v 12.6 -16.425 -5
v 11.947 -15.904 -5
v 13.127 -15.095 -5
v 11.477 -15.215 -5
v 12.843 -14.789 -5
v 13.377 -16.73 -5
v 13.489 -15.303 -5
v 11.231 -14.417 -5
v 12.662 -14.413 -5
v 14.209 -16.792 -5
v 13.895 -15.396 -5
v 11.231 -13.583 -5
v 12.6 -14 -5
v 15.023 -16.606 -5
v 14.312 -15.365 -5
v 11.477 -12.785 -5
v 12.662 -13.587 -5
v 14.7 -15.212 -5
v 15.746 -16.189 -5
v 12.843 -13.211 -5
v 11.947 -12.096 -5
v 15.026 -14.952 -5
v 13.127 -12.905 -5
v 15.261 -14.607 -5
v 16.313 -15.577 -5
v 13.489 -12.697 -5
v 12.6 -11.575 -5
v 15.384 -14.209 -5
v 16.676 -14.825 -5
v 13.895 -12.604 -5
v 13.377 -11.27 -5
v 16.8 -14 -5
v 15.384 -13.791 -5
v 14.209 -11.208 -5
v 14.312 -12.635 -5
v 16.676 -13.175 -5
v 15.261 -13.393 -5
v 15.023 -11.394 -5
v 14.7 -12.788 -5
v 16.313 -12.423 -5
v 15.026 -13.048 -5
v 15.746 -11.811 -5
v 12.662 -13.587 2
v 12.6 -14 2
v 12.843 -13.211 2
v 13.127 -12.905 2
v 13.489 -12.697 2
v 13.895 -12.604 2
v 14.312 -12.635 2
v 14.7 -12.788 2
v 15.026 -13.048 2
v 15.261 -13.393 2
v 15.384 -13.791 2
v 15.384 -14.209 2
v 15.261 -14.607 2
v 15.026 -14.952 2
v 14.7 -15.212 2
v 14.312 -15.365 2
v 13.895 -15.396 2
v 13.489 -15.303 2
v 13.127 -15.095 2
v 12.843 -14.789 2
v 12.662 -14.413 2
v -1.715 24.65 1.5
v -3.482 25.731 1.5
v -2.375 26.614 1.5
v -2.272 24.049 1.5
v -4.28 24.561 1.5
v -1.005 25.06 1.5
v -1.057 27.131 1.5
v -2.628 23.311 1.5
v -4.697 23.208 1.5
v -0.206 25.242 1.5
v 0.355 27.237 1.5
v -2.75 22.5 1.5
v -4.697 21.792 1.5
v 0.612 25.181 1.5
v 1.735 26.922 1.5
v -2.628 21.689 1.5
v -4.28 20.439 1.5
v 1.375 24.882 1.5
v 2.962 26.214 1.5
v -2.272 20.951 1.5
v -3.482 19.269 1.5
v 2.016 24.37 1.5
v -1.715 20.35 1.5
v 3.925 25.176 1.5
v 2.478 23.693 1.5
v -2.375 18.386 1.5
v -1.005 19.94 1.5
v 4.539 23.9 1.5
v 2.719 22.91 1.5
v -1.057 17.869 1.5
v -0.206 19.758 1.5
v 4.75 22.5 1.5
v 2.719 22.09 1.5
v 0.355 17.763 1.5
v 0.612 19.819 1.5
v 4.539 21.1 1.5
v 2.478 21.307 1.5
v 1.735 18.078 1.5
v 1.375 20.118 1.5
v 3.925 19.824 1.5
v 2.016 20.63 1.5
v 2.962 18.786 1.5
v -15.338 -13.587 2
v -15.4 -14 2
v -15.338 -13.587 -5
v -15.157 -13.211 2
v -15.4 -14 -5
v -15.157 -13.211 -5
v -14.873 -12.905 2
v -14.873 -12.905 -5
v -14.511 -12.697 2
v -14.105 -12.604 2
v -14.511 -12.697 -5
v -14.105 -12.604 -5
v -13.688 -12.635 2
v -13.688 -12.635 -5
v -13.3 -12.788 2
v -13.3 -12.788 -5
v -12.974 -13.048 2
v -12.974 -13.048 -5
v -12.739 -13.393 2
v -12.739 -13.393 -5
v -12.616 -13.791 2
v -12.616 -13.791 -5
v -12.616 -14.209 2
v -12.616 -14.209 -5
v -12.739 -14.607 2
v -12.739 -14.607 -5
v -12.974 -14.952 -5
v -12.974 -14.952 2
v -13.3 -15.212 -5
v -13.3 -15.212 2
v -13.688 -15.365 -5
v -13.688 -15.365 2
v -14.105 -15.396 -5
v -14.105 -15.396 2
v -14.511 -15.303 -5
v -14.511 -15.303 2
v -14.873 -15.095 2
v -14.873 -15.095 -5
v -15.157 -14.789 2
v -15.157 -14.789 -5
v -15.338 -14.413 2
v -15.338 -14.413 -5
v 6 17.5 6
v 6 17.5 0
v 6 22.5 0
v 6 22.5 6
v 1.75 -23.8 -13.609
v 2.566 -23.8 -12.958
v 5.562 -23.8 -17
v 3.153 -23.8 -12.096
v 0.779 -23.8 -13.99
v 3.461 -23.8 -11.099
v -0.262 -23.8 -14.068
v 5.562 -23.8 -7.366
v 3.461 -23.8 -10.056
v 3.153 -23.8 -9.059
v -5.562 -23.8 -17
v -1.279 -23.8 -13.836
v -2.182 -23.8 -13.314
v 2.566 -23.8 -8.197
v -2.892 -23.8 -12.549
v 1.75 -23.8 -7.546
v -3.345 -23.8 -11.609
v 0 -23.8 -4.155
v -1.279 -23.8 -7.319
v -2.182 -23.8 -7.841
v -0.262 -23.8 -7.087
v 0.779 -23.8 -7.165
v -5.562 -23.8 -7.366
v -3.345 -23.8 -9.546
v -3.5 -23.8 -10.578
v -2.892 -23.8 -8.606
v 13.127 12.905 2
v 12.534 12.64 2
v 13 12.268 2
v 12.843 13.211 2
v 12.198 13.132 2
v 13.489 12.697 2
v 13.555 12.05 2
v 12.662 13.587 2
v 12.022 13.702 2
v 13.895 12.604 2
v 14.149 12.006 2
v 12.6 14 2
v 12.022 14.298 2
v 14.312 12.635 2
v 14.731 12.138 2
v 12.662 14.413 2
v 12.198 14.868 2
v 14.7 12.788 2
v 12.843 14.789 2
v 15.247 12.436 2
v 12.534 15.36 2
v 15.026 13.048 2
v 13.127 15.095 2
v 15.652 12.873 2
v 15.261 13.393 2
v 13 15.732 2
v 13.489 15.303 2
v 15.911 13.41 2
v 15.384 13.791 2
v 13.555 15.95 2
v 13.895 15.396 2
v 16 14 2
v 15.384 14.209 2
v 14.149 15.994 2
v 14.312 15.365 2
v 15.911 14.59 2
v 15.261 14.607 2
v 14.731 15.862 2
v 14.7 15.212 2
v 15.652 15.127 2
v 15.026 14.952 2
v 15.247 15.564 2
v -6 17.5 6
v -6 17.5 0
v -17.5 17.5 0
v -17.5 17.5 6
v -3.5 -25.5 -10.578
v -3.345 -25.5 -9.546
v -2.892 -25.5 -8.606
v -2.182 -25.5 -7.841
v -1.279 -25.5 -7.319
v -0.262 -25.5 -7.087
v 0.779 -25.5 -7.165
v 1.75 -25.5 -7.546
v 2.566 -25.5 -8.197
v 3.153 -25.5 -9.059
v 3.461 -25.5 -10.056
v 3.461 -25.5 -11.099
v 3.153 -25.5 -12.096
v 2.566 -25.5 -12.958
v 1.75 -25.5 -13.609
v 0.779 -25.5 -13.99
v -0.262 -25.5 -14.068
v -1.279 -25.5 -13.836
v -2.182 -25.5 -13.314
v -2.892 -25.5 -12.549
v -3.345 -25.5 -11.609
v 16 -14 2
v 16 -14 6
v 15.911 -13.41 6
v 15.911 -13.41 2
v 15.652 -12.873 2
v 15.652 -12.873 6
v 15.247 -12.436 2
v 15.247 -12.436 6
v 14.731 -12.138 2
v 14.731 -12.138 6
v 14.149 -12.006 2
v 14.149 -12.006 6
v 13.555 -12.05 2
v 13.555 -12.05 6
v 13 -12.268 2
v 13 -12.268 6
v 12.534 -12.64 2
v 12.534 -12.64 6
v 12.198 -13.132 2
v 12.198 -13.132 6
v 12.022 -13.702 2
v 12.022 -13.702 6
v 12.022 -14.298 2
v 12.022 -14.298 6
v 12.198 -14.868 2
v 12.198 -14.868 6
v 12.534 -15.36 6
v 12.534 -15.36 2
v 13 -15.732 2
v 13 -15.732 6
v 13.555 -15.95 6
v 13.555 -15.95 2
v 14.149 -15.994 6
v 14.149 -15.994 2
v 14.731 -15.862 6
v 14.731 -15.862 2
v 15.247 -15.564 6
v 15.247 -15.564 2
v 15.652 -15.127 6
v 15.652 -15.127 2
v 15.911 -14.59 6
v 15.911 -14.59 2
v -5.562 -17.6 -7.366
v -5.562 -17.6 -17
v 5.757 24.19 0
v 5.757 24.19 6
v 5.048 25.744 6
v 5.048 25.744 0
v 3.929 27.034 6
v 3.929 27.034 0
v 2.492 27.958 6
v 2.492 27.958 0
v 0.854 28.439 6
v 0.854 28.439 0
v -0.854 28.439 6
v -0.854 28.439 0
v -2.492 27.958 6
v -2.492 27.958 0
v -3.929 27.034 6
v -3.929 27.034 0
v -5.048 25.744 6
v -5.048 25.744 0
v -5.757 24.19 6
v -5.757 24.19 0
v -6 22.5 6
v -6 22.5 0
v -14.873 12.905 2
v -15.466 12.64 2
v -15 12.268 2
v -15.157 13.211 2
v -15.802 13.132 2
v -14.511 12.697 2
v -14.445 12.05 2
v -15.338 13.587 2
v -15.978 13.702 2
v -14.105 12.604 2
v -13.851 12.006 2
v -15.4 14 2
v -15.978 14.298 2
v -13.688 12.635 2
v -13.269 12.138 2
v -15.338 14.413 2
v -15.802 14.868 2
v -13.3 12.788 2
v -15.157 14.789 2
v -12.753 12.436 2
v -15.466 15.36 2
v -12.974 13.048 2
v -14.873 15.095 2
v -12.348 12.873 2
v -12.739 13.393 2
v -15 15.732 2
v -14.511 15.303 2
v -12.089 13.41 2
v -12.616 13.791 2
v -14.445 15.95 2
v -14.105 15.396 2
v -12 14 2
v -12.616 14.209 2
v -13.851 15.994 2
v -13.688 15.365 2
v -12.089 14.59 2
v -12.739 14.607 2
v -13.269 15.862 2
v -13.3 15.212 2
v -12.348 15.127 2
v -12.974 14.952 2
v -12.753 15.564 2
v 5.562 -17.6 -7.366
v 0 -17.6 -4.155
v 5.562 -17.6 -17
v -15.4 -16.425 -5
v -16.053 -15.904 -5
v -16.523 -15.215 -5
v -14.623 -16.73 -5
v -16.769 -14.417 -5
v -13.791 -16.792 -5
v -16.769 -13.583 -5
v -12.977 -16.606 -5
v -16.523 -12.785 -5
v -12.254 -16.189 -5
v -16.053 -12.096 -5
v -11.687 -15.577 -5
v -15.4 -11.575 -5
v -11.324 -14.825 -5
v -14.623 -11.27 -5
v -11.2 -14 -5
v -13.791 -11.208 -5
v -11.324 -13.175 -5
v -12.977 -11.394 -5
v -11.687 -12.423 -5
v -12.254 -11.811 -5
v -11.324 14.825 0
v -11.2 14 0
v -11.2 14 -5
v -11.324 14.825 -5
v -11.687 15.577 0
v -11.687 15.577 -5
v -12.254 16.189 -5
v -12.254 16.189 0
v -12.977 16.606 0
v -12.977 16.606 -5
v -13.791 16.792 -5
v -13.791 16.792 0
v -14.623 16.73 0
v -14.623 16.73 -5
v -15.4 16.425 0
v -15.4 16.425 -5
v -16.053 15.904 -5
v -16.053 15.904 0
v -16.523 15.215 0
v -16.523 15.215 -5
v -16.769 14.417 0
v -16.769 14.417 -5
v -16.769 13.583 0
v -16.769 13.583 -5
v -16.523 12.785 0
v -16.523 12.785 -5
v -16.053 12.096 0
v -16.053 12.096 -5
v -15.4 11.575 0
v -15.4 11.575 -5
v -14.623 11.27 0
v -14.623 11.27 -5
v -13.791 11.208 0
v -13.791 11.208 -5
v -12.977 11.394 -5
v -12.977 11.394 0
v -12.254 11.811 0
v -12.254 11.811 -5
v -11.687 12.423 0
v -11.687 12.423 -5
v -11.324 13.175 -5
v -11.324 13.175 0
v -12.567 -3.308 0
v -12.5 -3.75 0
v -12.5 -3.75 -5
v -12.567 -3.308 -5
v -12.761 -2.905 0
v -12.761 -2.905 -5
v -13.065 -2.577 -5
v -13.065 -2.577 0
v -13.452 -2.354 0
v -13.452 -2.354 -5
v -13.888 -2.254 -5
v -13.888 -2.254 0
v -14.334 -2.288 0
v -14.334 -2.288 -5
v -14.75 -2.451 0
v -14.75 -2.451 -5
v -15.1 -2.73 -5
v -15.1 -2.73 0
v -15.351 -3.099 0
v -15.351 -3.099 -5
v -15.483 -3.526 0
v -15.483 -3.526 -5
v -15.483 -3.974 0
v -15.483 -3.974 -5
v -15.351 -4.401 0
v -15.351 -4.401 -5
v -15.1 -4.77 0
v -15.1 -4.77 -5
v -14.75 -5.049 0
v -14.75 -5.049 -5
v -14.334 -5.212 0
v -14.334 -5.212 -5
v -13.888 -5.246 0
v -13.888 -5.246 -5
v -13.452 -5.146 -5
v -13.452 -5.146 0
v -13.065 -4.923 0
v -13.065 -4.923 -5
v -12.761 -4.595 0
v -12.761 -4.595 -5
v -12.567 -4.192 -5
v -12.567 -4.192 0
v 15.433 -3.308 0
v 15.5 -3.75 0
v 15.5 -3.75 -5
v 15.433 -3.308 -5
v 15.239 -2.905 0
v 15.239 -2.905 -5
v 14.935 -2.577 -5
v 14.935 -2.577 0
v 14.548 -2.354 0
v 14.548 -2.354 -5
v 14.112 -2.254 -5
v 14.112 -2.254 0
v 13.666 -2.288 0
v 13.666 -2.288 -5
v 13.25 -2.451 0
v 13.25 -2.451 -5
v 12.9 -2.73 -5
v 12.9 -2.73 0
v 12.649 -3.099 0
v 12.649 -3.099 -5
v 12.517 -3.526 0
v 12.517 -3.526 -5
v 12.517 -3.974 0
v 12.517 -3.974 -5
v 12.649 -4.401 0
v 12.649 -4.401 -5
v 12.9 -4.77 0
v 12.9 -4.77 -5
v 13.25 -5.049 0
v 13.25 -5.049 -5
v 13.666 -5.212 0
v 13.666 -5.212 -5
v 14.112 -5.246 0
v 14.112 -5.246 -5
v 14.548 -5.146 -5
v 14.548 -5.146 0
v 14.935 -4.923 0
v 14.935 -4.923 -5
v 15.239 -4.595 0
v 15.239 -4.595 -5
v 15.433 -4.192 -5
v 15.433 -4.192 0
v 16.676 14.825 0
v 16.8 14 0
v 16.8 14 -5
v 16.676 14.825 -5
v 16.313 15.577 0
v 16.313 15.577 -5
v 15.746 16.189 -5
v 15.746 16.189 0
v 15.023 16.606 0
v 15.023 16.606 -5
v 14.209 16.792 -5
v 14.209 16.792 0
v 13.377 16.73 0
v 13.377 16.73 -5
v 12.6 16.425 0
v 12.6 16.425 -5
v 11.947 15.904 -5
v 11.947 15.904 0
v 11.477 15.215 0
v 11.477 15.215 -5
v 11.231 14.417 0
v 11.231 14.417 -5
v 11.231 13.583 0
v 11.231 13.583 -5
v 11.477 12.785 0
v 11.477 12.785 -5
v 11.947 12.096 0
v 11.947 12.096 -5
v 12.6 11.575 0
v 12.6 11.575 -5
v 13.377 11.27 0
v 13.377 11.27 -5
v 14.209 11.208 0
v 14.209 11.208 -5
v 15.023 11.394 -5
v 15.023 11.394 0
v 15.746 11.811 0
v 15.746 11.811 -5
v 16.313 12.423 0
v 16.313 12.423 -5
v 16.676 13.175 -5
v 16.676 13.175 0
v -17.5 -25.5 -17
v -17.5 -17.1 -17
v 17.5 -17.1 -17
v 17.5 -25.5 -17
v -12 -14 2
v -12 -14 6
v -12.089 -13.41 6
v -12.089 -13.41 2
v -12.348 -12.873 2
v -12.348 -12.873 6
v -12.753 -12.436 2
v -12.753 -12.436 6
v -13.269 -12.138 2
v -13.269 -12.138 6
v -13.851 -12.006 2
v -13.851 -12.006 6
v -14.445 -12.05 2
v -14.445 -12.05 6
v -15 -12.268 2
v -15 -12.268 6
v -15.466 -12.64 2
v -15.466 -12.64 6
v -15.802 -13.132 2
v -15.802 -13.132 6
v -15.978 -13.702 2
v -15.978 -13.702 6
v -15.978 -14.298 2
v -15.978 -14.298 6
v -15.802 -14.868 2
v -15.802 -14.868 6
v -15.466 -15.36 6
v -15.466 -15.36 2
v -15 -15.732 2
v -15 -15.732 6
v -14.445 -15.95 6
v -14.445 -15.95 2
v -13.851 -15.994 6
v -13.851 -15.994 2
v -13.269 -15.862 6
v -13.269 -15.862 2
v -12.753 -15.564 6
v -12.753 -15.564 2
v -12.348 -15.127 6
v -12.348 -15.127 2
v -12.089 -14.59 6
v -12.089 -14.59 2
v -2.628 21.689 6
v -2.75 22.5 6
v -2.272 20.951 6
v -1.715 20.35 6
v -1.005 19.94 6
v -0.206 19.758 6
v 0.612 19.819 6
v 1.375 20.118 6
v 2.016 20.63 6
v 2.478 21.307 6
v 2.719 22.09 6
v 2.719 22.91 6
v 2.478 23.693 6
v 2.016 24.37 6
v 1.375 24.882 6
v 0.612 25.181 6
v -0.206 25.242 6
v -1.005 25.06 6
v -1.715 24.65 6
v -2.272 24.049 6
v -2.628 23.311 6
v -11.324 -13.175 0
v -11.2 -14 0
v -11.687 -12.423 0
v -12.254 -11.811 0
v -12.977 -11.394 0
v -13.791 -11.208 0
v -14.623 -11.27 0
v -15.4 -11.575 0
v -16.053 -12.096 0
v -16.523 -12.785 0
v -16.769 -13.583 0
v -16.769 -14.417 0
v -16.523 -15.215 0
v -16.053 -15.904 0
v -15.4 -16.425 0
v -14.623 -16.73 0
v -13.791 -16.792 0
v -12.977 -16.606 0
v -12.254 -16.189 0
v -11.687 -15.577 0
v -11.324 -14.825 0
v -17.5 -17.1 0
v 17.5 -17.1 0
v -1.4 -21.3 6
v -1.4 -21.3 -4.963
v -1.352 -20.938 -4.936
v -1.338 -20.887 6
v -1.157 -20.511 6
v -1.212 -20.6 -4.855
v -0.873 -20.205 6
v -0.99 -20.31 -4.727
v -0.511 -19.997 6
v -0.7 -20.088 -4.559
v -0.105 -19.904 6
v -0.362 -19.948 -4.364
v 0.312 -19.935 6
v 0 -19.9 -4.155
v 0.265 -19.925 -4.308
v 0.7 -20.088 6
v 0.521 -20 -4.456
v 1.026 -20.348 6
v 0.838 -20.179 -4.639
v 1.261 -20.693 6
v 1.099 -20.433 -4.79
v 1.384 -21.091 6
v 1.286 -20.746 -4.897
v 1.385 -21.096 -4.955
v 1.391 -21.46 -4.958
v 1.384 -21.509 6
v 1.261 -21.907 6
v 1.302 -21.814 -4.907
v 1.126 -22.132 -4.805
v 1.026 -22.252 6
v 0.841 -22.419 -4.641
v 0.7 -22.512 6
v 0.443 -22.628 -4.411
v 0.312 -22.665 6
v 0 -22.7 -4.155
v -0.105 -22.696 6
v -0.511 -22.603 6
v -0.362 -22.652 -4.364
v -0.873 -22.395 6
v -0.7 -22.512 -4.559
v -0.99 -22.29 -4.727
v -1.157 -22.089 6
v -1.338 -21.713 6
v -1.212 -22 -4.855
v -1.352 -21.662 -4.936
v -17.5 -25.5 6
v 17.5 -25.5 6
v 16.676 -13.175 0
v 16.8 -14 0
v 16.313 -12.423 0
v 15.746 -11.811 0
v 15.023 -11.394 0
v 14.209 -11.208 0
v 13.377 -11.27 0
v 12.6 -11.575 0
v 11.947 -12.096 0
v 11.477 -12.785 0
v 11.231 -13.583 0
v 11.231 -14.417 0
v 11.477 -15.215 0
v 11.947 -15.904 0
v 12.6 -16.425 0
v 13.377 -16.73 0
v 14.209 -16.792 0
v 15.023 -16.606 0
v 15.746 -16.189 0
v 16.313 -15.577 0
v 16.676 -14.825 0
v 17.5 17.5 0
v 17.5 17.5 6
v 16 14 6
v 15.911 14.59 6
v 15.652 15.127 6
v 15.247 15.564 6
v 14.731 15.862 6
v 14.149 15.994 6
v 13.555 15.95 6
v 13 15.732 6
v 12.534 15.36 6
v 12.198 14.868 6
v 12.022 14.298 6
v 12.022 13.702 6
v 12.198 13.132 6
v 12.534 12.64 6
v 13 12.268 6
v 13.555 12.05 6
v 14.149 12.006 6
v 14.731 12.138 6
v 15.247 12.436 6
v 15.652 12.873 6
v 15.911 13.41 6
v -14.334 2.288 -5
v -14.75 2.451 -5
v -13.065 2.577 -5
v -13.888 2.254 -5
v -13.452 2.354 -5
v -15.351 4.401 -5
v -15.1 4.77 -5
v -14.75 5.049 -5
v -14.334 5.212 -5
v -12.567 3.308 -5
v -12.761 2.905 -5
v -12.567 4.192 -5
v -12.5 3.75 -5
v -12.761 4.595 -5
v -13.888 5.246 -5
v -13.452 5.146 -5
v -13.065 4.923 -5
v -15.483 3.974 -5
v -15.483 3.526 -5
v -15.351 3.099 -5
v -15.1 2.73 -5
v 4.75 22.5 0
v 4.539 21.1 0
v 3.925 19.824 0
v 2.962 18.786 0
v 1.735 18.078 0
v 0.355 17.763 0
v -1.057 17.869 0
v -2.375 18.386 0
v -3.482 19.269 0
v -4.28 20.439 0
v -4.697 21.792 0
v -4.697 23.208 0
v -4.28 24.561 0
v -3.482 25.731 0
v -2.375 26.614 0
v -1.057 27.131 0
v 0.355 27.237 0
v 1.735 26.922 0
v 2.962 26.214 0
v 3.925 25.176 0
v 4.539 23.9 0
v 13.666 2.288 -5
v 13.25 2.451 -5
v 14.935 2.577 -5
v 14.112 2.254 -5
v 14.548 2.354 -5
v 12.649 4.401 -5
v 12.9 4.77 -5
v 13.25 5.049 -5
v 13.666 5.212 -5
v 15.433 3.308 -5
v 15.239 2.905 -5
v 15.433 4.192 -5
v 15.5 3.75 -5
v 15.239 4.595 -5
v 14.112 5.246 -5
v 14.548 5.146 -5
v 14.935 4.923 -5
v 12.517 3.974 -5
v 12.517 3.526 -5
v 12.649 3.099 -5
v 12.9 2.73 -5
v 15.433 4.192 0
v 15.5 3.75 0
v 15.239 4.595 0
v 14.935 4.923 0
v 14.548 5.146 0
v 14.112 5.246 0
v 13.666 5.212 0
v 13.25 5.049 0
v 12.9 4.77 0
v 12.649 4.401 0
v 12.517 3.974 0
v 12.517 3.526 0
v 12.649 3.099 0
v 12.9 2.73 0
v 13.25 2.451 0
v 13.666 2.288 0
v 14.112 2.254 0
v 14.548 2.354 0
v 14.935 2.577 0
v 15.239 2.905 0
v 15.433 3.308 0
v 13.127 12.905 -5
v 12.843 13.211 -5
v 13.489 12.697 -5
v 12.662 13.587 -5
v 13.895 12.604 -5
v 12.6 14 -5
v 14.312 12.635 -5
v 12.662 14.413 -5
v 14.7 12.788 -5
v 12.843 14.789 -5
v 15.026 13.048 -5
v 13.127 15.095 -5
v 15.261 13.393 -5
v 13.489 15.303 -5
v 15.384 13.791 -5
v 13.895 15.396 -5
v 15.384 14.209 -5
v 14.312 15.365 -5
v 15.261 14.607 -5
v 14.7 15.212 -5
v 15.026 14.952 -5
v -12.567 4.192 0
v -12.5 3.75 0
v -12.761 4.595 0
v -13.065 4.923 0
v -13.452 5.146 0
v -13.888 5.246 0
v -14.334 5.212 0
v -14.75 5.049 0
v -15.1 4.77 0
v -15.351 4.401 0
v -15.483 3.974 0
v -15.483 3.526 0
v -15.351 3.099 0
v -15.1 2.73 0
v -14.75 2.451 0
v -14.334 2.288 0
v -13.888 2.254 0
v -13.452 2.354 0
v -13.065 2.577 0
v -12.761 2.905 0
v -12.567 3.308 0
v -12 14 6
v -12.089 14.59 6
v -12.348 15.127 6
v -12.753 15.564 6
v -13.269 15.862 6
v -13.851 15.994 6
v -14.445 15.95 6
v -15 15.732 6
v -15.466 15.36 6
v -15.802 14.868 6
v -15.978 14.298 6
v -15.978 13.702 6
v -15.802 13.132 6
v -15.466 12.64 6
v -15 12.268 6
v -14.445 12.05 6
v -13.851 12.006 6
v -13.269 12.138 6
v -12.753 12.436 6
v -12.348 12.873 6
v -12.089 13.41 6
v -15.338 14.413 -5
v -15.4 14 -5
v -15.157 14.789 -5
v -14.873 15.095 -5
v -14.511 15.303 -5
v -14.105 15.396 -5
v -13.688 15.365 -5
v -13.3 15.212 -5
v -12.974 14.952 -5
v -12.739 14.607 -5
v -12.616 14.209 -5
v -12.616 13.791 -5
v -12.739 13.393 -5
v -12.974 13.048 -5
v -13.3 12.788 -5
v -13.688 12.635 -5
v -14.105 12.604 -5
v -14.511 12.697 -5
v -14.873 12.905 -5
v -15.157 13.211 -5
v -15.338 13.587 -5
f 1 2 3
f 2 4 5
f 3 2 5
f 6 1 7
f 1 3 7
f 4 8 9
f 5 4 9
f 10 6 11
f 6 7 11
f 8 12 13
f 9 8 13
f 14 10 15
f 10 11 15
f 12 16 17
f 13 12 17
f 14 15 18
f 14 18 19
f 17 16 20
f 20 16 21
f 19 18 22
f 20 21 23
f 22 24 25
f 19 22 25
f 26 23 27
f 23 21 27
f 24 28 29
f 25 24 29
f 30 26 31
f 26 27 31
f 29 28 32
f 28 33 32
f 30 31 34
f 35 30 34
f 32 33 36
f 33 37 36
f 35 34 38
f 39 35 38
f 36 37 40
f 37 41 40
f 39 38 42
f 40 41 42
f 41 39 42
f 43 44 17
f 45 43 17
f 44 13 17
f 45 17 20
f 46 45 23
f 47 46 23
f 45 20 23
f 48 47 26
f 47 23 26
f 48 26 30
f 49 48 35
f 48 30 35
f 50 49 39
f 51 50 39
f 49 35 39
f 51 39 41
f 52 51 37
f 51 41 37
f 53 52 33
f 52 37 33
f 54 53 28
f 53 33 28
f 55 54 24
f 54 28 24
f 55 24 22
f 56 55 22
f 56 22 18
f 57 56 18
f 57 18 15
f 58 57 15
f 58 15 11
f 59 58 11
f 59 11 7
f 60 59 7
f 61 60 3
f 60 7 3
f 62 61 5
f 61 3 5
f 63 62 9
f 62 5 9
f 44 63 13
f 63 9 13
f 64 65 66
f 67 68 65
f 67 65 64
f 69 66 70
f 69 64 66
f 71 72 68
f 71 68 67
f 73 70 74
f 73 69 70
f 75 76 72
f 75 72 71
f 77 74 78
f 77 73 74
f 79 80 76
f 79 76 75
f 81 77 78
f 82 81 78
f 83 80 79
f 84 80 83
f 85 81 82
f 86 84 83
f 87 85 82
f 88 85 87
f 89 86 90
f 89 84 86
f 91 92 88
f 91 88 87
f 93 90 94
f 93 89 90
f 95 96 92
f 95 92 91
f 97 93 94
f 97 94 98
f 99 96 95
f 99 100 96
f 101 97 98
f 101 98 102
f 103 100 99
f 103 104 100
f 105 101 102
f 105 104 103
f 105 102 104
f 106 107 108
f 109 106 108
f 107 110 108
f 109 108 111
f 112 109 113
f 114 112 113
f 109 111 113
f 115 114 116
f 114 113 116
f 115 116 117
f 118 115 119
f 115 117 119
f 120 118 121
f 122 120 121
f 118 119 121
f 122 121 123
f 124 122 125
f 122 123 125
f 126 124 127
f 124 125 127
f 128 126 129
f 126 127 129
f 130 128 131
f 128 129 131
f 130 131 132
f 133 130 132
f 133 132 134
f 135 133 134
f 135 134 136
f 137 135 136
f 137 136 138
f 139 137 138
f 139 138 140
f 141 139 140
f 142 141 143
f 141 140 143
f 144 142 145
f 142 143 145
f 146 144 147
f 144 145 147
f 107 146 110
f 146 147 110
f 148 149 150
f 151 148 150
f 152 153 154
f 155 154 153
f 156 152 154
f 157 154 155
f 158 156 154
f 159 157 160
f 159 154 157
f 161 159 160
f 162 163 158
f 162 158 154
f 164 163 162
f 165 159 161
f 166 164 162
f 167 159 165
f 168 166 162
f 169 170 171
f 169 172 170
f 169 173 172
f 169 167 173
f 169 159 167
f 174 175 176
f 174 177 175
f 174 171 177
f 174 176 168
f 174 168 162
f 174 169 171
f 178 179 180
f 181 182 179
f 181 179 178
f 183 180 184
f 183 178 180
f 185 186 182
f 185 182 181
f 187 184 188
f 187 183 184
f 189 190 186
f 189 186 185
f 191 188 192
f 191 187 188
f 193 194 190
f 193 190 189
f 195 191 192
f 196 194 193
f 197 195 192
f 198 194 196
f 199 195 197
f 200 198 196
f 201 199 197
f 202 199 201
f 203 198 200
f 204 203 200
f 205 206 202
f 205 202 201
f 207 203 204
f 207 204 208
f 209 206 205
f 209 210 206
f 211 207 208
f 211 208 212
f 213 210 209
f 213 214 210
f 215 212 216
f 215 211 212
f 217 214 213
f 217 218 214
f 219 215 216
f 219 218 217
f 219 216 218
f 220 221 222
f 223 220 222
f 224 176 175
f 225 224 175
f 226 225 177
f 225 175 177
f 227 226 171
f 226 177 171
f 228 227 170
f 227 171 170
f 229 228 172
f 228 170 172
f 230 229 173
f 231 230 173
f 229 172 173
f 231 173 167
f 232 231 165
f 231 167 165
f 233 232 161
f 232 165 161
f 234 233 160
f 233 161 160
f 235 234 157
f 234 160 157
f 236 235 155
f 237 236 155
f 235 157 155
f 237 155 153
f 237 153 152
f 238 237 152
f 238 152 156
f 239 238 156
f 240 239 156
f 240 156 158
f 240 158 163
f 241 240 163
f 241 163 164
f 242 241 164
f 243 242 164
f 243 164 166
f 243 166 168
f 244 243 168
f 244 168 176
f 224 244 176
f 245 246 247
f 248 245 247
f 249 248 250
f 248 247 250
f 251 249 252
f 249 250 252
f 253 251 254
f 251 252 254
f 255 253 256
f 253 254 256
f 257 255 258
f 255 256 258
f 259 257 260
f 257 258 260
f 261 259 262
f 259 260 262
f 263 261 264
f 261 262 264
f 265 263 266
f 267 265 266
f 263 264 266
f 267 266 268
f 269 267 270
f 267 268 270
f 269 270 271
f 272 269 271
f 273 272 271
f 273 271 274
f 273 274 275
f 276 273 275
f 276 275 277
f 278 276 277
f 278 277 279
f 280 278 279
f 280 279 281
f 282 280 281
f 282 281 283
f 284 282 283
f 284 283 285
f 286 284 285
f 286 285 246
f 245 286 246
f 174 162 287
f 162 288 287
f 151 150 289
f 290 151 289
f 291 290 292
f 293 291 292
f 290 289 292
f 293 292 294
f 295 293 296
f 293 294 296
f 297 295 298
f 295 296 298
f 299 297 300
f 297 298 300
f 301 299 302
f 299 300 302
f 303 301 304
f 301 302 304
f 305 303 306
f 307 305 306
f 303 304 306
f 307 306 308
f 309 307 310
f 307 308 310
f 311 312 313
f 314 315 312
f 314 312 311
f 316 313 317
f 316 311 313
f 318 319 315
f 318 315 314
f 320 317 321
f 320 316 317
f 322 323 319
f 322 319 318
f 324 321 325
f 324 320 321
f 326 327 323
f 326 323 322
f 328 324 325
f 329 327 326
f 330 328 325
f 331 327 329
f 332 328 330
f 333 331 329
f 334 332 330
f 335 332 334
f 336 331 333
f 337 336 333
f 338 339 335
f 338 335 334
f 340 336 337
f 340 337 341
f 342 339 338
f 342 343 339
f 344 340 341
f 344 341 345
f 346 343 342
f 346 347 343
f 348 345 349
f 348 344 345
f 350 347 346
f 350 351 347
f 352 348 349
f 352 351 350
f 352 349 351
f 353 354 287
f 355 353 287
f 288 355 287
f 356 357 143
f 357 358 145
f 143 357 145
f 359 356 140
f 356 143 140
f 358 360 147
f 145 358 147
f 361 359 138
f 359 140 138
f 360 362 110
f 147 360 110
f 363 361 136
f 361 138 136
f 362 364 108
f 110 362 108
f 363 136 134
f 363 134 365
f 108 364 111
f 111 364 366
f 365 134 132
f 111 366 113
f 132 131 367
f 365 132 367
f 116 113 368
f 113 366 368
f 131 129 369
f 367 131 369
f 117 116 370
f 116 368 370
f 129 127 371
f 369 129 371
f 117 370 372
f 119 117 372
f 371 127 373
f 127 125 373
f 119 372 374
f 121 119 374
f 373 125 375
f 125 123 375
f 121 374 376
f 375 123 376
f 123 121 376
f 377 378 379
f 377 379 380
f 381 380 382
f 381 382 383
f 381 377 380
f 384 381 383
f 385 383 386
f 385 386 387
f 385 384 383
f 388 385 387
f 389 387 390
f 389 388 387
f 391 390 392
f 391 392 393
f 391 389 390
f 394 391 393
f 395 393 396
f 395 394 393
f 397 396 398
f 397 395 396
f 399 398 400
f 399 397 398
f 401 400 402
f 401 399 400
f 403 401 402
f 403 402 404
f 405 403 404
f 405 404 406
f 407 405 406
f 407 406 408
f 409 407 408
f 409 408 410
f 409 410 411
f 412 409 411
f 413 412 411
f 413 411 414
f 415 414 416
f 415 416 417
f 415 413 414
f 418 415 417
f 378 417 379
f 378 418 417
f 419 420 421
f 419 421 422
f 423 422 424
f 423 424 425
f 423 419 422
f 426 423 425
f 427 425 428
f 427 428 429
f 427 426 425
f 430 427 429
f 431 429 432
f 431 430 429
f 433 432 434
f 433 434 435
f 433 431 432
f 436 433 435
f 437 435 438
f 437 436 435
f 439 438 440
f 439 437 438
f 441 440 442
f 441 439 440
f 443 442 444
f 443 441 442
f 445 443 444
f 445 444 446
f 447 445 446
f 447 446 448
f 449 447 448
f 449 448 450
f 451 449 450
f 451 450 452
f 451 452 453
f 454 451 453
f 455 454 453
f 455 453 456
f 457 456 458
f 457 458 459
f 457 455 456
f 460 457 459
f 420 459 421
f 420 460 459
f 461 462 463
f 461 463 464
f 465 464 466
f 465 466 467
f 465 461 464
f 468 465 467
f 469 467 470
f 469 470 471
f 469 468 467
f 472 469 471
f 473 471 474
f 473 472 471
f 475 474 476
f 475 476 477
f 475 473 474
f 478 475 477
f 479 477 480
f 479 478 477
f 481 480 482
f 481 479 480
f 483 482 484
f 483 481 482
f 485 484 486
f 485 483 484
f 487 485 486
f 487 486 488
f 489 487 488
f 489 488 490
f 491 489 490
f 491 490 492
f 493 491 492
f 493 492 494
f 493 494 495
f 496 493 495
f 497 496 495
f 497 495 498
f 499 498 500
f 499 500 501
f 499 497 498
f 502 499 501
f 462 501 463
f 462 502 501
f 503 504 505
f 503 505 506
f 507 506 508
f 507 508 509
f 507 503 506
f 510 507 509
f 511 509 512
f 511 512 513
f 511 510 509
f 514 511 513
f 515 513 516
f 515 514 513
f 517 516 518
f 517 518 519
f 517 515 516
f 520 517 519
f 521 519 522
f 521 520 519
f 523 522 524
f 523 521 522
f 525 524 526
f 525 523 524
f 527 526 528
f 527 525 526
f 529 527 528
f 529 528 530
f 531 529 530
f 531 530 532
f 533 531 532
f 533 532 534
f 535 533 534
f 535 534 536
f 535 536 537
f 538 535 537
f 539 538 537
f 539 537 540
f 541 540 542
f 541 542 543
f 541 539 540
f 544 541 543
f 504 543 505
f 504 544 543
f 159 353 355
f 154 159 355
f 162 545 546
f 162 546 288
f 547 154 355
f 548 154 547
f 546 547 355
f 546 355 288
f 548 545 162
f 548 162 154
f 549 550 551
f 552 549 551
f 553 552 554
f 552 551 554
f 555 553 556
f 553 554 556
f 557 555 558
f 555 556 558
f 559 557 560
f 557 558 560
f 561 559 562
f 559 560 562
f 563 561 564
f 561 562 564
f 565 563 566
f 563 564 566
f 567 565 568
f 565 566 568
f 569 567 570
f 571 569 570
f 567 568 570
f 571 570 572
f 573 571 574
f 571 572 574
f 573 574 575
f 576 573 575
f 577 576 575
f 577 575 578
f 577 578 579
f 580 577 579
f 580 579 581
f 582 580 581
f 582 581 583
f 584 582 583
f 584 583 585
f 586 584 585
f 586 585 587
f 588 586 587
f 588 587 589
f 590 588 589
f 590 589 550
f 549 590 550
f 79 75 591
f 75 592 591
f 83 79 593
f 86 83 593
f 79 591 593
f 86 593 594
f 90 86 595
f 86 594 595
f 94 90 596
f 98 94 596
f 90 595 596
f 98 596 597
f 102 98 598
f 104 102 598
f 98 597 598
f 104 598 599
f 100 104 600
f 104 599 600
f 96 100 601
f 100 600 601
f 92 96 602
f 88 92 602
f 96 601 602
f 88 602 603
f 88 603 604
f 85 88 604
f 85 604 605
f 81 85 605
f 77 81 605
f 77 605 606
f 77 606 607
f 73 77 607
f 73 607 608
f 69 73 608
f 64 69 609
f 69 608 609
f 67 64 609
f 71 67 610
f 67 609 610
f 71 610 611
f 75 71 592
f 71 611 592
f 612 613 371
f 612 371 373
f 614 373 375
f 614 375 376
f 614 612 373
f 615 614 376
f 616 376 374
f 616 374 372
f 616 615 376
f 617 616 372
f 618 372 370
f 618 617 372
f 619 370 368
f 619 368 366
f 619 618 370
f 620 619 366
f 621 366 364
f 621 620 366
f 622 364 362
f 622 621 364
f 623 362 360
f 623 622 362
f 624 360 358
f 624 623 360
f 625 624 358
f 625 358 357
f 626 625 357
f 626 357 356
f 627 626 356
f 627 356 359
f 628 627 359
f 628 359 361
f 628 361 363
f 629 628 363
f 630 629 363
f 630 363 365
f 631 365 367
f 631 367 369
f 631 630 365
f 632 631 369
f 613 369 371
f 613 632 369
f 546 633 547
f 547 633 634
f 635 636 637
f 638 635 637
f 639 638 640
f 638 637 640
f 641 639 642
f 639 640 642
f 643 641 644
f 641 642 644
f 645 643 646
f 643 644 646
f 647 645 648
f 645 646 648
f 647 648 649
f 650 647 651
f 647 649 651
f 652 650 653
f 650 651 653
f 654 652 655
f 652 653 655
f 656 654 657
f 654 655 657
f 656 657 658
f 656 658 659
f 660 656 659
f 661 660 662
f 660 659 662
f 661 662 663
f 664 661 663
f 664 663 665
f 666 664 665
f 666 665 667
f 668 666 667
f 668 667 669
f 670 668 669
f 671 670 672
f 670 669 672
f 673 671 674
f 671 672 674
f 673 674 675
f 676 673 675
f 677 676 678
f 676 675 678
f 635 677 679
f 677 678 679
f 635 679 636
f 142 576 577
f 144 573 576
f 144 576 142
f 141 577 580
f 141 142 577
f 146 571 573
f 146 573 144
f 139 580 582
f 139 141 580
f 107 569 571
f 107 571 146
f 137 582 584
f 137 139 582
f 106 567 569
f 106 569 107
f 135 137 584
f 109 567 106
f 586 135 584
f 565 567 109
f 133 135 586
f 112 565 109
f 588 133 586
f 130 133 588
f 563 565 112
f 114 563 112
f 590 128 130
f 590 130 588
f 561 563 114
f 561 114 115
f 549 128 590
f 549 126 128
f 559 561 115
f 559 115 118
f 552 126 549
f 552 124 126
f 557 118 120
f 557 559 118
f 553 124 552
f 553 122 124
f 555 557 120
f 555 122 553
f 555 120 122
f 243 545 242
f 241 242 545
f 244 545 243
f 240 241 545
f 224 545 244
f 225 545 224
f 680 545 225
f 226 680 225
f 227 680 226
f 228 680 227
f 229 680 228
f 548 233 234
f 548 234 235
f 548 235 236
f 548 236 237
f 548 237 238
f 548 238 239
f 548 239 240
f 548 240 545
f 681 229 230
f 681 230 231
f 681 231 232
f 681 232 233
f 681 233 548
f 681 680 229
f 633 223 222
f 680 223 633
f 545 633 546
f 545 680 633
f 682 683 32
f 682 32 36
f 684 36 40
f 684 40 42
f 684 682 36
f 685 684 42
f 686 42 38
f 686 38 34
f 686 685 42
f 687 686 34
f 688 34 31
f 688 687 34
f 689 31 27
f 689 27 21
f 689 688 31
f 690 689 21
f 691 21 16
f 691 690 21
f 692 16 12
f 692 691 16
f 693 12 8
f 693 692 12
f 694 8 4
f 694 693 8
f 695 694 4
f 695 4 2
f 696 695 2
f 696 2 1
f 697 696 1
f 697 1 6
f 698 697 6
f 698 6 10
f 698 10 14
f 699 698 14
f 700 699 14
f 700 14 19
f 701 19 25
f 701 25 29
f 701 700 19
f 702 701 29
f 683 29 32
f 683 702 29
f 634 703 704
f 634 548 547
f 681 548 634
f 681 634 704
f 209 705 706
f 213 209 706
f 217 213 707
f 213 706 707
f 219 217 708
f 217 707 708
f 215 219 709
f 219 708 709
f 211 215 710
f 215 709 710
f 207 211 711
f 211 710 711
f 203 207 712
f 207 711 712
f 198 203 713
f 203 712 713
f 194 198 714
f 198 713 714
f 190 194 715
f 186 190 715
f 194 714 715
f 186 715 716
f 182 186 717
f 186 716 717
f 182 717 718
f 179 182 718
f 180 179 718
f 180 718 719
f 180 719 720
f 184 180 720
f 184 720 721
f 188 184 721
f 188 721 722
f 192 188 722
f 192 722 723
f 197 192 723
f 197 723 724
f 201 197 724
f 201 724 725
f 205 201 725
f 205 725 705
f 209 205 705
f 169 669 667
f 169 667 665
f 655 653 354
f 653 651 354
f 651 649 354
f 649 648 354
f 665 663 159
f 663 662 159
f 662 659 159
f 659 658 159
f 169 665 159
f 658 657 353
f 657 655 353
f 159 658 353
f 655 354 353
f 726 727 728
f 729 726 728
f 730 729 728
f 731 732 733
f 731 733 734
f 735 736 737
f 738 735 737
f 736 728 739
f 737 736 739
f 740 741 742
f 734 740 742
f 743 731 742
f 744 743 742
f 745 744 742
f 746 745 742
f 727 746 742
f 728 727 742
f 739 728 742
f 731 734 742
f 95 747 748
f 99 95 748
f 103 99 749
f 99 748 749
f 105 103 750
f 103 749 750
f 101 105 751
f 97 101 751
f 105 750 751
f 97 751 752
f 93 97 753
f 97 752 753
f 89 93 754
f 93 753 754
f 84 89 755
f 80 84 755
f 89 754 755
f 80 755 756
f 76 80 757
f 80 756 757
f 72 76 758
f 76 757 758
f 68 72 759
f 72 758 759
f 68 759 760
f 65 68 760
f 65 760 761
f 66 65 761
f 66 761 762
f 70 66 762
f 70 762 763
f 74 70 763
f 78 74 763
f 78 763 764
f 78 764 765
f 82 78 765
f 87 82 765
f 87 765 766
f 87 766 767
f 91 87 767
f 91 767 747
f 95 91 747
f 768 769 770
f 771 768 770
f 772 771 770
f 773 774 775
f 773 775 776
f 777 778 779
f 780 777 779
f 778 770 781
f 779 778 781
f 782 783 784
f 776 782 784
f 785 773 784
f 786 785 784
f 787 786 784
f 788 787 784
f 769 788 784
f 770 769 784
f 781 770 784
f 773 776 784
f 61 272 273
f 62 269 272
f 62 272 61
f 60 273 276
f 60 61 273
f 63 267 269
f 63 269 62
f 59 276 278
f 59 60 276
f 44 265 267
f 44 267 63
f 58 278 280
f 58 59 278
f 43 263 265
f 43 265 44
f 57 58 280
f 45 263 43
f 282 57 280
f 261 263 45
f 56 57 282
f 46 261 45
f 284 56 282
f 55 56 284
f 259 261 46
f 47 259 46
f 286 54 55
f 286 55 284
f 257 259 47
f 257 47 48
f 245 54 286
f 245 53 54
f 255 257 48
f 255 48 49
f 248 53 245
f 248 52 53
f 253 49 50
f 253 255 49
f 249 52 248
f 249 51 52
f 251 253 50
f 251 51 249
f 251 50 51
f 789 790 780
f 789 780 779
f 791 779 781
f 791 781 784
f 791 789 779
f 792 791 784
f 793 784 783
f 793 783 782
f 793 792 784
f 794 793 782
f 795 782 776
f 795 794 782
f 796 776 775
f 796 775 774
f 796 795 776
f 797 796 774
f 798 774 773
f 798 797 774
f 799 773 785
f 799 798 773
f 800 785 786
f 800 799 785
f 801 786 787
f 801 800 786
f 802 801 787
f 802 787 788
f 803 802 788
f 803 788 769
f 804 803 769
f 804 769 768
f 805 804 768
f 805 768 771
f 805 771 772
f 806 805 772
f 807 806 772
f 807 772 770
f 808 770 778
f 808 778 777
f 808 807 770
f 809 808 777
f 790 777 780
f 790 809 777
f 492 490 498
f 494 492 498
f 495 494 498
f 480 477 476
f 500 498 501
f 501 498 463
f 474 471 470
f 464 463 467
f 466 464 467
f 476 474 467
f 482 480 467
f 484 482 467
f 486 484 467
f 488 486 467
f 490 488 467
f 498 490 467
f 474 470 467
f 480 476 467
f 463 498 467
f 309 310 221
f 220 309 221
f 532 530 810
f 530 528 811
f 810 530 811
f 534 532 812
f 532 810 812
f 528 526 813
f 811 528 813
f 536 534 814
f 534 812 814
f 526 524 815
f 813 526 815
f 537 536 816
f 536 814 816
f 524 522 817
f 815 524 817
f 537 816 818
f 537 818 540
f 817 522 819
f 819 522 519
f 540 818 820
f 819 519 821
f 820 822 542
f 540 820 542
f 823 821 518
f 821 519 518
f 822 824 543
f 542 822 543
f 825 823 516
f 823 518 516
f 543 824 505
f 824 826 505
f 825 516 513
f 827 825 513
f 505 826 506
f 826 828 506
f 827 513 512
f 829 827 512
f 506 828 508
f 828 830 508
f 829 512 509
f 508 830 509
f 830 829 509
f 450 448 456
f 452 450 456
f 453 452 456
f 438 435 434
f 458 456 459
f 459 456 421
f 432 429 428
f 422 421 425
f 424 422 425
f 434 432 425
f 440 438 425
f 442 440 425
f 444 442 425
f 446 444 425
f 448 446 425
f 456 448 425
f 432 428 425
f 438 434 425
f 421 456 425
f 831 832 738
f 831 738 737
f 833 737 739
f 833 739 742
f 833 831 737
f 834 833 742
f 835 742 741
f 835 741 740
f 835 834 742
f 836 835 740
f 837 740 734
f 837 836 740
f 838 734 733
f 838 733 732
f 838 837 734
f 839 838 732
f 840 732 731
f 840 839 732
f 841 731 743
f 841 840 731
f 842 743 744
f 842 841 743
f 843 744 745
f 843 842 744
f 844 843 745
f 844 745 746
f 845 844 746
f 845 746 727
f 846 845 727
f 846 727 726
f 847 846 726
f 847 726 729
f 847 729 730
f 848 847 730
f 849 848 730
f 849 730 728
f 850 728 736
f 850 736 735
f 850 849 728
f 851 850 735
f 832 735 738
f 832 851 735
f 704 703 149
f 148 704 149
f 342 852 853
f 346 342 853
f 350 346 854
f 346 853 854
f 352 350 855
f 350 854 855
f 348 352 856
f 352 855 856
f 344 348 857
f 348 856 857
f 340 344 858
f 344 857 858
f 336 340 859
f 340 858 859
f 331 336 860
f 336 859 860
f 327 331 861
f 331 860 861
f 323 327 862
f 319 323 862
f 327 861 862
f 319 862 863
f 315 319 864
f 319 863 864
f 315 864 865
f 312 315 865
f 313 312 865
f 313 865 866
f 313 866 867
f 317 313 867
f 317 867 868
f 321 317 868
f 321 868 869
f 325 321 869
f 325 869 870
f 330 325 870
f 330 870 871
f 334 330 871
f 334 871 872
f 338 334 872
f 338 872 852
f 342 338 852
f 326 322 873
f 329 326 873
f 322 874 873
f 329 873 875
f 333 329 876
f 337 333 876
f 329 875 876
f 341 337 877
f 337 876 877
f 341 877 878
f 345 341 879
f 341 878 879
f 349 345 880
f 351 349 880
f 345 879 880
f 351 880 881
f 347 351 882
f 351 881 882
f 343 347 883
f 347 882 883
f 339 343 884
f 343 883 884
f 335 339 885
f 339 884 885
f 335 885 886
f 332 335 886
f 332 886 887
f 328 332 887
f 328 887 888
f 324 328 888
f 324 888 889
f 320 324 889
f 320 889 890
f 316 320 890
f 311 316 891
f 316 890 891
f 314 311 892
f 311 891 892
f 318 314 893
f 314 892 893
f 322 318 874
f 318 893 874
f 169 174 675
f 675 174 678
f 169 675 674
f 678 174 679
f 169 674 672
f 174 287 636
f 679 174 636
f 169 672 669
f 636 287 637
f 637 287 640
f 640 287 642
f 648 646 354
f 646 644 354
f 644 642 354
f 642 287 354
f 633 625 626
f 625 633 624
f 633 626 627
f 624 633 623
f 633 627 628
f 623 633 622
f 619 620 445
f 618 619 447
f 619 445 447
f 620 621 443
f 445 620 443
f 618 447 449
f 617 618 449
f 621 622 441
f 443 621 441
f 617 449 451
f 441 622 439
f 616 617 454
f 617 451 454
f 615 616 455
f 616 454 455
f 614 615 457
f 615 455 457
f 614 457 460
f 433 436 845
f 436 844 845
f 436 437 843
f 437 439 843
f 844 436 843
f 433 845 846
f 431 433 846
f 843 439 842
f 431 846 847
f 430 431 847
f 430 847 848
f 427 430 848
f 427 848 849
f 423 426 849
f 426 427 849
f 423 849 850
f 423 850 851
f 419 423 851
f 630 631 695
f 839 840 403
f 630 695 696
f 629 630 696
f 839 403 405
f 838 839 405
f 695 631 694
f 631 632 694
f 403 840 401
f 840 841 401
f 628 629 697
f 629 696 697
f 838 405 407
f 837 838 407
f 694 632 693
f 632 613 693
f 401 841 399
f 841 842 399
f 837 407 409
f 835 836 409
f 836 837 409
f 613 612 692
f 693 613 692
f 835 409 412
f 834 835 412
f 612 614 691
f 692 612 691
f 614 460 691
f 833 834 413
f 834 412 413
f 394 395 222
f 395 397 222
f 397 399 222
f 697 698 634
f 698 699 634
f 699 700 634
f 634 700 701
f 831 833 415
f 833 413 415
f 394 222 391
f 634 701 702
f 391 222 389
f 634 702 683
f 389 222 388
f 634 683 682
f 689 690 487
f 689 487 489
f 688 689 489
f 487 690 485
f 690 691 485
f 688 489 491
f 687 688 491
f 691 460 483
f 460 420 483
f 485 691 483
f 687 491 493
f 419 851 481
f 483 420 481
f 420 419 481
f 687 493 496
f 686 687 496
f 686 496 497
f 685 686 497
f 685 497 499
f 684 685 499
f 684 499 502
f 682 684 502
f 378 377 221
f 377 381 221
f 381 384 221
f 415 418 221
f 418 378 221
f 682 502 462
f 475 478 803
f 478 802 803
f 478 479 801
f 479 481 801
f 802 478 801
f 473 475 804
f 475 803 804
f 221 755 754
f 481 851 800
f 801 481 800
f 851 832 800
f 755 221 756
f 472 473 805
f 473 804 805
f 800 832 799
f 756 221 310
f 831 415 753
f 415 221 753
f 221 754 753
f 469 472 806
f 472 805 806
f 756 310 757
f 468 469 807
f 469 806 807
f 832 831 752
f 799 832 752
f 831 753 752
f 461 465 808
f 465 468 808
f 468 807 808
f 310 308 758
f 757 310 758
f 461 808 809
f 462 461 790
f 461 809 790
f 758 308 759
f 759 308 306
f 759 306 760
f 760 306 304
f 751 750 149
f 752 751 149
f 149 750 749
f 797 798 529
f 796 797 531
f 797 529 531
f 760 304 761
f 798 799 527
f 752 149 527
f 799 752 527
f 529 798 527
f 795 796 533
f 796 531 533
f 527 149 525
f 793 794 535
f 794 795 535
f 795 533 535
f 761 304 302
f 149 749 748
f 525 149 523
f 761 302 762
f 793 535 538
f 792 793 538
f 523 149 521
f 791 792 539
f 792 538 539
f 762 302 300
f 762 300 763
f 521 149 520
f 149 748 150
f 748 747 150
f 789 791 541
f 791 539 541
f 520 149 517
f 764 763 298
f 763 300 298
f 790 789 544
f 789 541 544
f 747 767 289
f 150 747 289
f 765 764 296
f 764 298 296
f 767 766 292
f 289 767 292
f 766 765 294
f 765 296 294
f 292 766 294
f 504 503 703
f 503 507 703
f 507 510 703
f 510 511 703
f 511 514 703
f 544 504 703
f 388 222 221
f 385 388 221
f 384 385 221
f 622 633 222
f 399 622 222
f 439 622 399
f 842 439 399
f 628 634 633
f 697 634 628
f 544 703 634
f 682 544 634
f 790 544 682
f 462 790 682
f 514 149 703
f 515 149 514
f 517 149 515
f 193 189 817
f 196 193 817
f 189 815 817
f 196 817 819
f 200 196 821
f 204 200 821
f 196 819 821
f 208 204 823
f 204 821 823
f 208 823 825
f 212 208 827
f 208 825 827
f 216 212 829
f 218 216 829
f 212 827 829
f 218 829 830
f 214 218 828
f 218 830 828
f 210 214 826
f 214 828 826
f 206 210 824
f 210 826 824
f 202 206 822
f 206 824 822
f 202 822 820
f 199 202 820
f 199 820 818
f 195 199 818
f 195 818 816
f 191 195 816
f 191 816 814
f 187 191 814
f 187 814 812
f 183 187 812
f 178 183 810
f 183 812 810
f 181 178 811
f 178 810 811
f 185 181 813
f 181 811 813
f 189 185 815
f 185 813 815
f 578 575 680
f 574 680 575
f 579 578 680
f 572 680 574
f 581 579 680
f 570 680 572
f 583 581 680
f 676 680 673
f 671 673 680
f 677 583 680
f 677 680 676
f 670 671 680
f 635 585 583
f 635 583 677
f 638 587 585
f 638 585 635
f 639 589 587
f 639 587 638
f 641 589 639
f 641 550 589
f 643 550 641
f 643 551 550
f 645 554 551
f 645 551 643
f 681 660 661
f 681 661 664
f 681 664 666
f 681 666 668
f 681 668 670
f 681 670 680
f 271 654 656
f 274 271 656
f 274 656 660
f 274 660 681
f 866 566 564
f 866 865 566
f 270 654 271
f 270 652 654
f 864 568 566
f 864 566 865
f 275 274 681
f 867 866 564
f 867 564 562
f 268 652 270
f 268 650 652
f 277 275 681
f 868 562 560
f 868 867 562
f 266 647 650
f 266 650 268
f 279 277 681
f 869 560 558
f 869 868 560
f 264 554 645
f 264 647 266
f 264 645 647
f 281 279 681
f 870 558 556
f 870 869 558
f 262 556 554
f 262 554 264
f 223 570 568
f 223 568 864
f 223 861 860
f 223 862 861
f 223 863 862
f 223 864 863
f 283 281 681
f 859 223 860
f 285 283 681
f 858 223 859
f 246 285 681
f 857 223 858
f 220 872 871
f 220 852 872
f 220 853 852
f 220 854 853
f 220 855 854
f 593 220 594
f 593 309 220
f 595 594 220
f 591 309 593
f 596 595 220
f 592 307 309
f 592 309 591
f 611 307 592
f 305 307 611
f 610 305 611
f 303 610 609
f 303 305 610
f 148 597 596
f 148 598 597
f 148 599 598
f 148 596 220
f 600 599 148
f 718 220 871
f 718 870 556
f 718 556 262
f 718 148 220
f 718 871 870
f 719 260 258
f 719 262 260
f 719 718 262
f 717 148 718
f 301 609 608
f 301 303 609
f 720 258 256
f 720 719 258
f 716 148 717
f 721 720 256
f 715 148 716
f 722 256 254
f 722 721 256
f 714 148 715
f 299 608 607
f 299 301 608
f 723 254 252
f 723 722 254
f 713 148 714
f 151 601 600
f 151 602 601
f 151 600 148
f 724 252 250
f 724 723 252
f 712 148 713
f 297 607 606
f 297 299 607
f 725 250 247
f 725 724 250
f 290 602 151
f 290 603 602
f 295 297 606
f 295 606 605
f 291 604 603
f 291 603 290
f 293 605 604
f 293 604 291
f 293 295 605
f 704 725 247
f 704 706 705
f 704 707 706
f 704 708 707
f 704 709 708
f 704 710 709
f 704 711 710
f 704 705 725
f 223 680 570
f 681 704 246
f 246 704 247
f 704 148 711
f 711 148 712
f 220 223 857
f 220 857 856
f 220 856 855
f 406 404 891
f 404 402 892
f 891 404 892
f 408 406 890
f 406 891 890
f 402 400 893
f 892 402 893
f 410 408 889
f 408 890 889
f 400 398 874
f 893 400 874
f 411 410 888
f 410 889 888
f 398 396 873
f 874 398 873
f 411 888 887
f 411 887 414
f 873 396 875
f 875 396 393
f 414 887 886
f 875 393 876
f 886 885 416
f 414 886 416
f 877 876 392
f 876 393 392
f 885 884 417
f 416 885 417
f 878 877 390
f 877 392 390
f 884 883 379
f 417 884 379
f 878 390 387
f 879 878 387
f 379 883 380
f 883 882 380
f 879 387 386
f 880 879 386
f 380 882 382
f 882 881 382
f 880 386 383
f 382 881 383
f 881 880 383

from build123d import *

# Parameters (mm, degrees)
F0_R           = 2.8
F0_R_2         = 1.5
F1_DEPTH       = 6
F2_DEPTH       = 5
F3_D           = 5.5
F3_DEPTH       = 30
F3_CBORE_D     = 9.5
F3_CBORE_DEPTH = 1.5
F3_TIP         = 1.6523667023
F5_D           = 2.8
F5_CBORE_D     = 4
F5_CBORE_DEPTH = 4
F6_W           = 35
F6_H           = 17
F6_H_2         = 6
F7_DEPTH       = 8
F7_DEPTH_BACK  = 0.4
F10_DEPTH      = 3.7
F10_DEPTH_BACK = 2.5
F11_D          = 7
F11_DEPTH      = 4.201
F13_D          = 2.8


with BuildPart() as f1:
    # F0 (on Top) → F1 (new body)
    with BuildSketch(Plane.XY):
        with BuildLine():
            Line((-6, 17.5), (-17.5, 17.5))
            Line((-17.5, 17.5), (-17.5, -17.5))
            Line((-17.5, -17.5), (17.5, -17.5))
            Line((17.5, -17.5), (17.5, 17.5))
            Line((17.5, 17.5), (6, 17.5))
            Line((6, 17.5), (3.3166247904, 17.5))
            ThreePointArc((3.3166247904, 17.5), (0, 16.5), (-3.3166247904, 17.5))
            Line((-3.3166247904, 17.5), (-6, 17.5))
        make_face()
        with Locations((-14, -14)):
            Circle(F0_R, mode=Mode.SUBTRACT)
        with Locations((-14, -3.75)):
            Circle(F0_R_2, mode=Mode.SUBTRACT)
        with Locations((-14, 3.75)):
            Circle(F0_R_2, mode=Mode.SUBTRACT)
        with Locations((14, -14)):
            Circle(F0_R, mode=Mode.SUBTRACT)
        with Locations((14, -3.75)):
            Circle(F0_R_2, mode=Mode.SUBTRACT)
        with Locations((14, 3.75)):
            Circle(F0_R_2, mode=Mode.SUBTRACT)
        with Locations((-14, 14)):
            Circle(F0_R, mode=Mode.SUBTRACT)
        with Locations((14, 14)):
            Circle(F0_R, mode=Mode.SUBTRACT)
        with BuildLine():
            ThreePointArc((-6, 22.5), (-5.2867640737, 19.6627256691), (-3.3166247904, 17.5))
            Line((-3.3166247904, 17.5), (3.3166247904, 17.5))
            ThreePointArc((3.3166247904, 17.5), (5.2867640737, 19.6627256691), (6, 22.5))
            Line((6, 22.5), (-6, 22.5))
        make_face()
        with BuildLine():
            ThreePointArc((6, 22.5), (0, 28.5), (-6, 22.5))
            Line((-6, 22.5), (6, 22.5))
        make_face()
        with BuildLine():
            ThreePointArc((6, 22.5), (5.2867640737, 19.6627256691), (3.3166247904, 17.5))
            Line((3.3166247904, 17.5), (6, 17.5))
            Line((6, 17.5), (6, 22.5))
        make_face()
        with BuildLine():
            Line((3.3166247904, 17.5), (-3.3166247904, 17.5))
            ThreePointArc((-3.3166247904, 17.5), (0, 16.5), (3.3166247904, 17.5))
        make_face()
        with BuildLine():
            Line((-6, 22.5), (-6, 17.5))
            Line((-6, 17.5), (-3.3166247904, 17.5))
            ThreePointArc((-3.3166247904, 17.5), (-5.2867640737, 19.6627256691), (-6, 22.5))
        make_face()
        with Locations((-14, -14)):
            Circle(F0_R)
        with Locations((14, -14)):
            Circle(F0_R)
        with Locations((14, 14)):
            Circle(F0_R)
        with Locations((-14, 14)):
            Circle(F0_R)
        with Locations((-14, 3.75)):
            Circle(F0_R_2)
        with Locations((-14, -3.75)):
            Circle(F0_R_2)
        with Locations((14, -3.75)):
            Circle(F0_R_2)
        with Locations((14, 3.75)):
            Circle(F0_R_2)
    extrude(amount=F1_DEPTH)

    # F0 (on Top) → F2 (join)
    with BuildSketch(Plane.XY):
        with Locations((-14, -14)):
            Circle(F0_R)
        with Locations((-14, 14)):
            Circle(F0_R)
        with Locations((14, 14)):
            Circle(F0_R)
        with Locations((14, -14)):
            Circle(F0_R)
        with Locations((-14, 3.75)):
            Circle(F0_R_2)
        with Locations((-14, -3.75)):
            Circle(F0_R_2)
        with Locations((14, -3.75)):
            Circle(F0_R_2)
        with Locations((14, 3.75)):
            Circle(F0_R_2)
    extrude(amount=-F2_DEPTH)

    # F3
    with Locations(Plane(origin=(0, 0, 0), x_dir=(1, 0, 0), z_dir=(0, 0, -1))):
        with Locations((0, -22.5)):
            CounterBoreHole(F3_D / 2, F3_CBORE_D / 2, F3_CBORE_DEPTH, depth=F3_DEPTH)
            with Locations((0, 0, -(F3_DEPTH + F3_TIP / 2))):  # 118° drill point
                Cone(0, F3_D / 2, F3_TIP, mode=Mode.SUBTRACT)

    # F5 (through all)
    with Locations(Plane.XY.offset(6)):
        with Locations((-14, 14), (14, 14), (14, -14), (-14, -14)):
            CounterBoreHole(F5_D / 2, F5_CBORE_D / 2, F5_CBORE_DEPTH)

    # F6 (on face) → F7 (join, two sides)
    with BuildSketch(Plane.XZ.offset(17.5)) as f7_sk:
        with Locations((0, -8.5)):
            Rectangle(F6_W, F6_H)
        with Locations((0, 3)):
            Rectangle(F6_W, F6_H_2)
    extrude(amount=F7_DEPTH)
    extrude(f7_sk.sketch, amount=-F7_DEPTH_BACK)

    # F9 (on mid) → F10 (cut, two sides)
    with BuildSketch(Plane(origin=(0, -21.3, 0), x_dir=(-1, 0, 0), z_dir=(0, 1, 0))) as f10_sk:
        Polygon((5.562, -13.7887778028), (-5.562, -13.7887778028), (0, -17), align=None)
        Polygon((-5.562, -7.3663334083), (-5.562, -13.7887778028), (5.562, -13.7887778028), (5.562, -7.3663334083), (0, -4.1551112111), align=None)
        Polygon((0, -17), (-5.562, -13.7887778028), (-5.562, -17), align=None)
        Polygon((5.562, -13.7887778028), (0, -17), (5.562, -17), align=None)
    extrude(amount=F10_DEPTH, mode=Mode.SUBTRACT)
    extrude(f10_sk.sketch, amount=-F10_DEPTH_BACK, mode=Mode.SUBTRACT)

    # F11 (through all, one way)
    with BuildSketch(Plane(origin=(0, -21.3, 0), x_dir=(-1, 0, 0), z_dir=(0, 1, 0))):
        with Locations((0, -10.5775556055)):
            Circle(F11_D / 2)
    extrude(amount=-F11_DEPTH, mode=Mode.SUBTRACT)

    # F13 (through all)
    with Locations(Plane.XY.offset(6)):
        with Locations((0, -21.3)):
            Hole(F13_D / 2)


solid = f1.part
